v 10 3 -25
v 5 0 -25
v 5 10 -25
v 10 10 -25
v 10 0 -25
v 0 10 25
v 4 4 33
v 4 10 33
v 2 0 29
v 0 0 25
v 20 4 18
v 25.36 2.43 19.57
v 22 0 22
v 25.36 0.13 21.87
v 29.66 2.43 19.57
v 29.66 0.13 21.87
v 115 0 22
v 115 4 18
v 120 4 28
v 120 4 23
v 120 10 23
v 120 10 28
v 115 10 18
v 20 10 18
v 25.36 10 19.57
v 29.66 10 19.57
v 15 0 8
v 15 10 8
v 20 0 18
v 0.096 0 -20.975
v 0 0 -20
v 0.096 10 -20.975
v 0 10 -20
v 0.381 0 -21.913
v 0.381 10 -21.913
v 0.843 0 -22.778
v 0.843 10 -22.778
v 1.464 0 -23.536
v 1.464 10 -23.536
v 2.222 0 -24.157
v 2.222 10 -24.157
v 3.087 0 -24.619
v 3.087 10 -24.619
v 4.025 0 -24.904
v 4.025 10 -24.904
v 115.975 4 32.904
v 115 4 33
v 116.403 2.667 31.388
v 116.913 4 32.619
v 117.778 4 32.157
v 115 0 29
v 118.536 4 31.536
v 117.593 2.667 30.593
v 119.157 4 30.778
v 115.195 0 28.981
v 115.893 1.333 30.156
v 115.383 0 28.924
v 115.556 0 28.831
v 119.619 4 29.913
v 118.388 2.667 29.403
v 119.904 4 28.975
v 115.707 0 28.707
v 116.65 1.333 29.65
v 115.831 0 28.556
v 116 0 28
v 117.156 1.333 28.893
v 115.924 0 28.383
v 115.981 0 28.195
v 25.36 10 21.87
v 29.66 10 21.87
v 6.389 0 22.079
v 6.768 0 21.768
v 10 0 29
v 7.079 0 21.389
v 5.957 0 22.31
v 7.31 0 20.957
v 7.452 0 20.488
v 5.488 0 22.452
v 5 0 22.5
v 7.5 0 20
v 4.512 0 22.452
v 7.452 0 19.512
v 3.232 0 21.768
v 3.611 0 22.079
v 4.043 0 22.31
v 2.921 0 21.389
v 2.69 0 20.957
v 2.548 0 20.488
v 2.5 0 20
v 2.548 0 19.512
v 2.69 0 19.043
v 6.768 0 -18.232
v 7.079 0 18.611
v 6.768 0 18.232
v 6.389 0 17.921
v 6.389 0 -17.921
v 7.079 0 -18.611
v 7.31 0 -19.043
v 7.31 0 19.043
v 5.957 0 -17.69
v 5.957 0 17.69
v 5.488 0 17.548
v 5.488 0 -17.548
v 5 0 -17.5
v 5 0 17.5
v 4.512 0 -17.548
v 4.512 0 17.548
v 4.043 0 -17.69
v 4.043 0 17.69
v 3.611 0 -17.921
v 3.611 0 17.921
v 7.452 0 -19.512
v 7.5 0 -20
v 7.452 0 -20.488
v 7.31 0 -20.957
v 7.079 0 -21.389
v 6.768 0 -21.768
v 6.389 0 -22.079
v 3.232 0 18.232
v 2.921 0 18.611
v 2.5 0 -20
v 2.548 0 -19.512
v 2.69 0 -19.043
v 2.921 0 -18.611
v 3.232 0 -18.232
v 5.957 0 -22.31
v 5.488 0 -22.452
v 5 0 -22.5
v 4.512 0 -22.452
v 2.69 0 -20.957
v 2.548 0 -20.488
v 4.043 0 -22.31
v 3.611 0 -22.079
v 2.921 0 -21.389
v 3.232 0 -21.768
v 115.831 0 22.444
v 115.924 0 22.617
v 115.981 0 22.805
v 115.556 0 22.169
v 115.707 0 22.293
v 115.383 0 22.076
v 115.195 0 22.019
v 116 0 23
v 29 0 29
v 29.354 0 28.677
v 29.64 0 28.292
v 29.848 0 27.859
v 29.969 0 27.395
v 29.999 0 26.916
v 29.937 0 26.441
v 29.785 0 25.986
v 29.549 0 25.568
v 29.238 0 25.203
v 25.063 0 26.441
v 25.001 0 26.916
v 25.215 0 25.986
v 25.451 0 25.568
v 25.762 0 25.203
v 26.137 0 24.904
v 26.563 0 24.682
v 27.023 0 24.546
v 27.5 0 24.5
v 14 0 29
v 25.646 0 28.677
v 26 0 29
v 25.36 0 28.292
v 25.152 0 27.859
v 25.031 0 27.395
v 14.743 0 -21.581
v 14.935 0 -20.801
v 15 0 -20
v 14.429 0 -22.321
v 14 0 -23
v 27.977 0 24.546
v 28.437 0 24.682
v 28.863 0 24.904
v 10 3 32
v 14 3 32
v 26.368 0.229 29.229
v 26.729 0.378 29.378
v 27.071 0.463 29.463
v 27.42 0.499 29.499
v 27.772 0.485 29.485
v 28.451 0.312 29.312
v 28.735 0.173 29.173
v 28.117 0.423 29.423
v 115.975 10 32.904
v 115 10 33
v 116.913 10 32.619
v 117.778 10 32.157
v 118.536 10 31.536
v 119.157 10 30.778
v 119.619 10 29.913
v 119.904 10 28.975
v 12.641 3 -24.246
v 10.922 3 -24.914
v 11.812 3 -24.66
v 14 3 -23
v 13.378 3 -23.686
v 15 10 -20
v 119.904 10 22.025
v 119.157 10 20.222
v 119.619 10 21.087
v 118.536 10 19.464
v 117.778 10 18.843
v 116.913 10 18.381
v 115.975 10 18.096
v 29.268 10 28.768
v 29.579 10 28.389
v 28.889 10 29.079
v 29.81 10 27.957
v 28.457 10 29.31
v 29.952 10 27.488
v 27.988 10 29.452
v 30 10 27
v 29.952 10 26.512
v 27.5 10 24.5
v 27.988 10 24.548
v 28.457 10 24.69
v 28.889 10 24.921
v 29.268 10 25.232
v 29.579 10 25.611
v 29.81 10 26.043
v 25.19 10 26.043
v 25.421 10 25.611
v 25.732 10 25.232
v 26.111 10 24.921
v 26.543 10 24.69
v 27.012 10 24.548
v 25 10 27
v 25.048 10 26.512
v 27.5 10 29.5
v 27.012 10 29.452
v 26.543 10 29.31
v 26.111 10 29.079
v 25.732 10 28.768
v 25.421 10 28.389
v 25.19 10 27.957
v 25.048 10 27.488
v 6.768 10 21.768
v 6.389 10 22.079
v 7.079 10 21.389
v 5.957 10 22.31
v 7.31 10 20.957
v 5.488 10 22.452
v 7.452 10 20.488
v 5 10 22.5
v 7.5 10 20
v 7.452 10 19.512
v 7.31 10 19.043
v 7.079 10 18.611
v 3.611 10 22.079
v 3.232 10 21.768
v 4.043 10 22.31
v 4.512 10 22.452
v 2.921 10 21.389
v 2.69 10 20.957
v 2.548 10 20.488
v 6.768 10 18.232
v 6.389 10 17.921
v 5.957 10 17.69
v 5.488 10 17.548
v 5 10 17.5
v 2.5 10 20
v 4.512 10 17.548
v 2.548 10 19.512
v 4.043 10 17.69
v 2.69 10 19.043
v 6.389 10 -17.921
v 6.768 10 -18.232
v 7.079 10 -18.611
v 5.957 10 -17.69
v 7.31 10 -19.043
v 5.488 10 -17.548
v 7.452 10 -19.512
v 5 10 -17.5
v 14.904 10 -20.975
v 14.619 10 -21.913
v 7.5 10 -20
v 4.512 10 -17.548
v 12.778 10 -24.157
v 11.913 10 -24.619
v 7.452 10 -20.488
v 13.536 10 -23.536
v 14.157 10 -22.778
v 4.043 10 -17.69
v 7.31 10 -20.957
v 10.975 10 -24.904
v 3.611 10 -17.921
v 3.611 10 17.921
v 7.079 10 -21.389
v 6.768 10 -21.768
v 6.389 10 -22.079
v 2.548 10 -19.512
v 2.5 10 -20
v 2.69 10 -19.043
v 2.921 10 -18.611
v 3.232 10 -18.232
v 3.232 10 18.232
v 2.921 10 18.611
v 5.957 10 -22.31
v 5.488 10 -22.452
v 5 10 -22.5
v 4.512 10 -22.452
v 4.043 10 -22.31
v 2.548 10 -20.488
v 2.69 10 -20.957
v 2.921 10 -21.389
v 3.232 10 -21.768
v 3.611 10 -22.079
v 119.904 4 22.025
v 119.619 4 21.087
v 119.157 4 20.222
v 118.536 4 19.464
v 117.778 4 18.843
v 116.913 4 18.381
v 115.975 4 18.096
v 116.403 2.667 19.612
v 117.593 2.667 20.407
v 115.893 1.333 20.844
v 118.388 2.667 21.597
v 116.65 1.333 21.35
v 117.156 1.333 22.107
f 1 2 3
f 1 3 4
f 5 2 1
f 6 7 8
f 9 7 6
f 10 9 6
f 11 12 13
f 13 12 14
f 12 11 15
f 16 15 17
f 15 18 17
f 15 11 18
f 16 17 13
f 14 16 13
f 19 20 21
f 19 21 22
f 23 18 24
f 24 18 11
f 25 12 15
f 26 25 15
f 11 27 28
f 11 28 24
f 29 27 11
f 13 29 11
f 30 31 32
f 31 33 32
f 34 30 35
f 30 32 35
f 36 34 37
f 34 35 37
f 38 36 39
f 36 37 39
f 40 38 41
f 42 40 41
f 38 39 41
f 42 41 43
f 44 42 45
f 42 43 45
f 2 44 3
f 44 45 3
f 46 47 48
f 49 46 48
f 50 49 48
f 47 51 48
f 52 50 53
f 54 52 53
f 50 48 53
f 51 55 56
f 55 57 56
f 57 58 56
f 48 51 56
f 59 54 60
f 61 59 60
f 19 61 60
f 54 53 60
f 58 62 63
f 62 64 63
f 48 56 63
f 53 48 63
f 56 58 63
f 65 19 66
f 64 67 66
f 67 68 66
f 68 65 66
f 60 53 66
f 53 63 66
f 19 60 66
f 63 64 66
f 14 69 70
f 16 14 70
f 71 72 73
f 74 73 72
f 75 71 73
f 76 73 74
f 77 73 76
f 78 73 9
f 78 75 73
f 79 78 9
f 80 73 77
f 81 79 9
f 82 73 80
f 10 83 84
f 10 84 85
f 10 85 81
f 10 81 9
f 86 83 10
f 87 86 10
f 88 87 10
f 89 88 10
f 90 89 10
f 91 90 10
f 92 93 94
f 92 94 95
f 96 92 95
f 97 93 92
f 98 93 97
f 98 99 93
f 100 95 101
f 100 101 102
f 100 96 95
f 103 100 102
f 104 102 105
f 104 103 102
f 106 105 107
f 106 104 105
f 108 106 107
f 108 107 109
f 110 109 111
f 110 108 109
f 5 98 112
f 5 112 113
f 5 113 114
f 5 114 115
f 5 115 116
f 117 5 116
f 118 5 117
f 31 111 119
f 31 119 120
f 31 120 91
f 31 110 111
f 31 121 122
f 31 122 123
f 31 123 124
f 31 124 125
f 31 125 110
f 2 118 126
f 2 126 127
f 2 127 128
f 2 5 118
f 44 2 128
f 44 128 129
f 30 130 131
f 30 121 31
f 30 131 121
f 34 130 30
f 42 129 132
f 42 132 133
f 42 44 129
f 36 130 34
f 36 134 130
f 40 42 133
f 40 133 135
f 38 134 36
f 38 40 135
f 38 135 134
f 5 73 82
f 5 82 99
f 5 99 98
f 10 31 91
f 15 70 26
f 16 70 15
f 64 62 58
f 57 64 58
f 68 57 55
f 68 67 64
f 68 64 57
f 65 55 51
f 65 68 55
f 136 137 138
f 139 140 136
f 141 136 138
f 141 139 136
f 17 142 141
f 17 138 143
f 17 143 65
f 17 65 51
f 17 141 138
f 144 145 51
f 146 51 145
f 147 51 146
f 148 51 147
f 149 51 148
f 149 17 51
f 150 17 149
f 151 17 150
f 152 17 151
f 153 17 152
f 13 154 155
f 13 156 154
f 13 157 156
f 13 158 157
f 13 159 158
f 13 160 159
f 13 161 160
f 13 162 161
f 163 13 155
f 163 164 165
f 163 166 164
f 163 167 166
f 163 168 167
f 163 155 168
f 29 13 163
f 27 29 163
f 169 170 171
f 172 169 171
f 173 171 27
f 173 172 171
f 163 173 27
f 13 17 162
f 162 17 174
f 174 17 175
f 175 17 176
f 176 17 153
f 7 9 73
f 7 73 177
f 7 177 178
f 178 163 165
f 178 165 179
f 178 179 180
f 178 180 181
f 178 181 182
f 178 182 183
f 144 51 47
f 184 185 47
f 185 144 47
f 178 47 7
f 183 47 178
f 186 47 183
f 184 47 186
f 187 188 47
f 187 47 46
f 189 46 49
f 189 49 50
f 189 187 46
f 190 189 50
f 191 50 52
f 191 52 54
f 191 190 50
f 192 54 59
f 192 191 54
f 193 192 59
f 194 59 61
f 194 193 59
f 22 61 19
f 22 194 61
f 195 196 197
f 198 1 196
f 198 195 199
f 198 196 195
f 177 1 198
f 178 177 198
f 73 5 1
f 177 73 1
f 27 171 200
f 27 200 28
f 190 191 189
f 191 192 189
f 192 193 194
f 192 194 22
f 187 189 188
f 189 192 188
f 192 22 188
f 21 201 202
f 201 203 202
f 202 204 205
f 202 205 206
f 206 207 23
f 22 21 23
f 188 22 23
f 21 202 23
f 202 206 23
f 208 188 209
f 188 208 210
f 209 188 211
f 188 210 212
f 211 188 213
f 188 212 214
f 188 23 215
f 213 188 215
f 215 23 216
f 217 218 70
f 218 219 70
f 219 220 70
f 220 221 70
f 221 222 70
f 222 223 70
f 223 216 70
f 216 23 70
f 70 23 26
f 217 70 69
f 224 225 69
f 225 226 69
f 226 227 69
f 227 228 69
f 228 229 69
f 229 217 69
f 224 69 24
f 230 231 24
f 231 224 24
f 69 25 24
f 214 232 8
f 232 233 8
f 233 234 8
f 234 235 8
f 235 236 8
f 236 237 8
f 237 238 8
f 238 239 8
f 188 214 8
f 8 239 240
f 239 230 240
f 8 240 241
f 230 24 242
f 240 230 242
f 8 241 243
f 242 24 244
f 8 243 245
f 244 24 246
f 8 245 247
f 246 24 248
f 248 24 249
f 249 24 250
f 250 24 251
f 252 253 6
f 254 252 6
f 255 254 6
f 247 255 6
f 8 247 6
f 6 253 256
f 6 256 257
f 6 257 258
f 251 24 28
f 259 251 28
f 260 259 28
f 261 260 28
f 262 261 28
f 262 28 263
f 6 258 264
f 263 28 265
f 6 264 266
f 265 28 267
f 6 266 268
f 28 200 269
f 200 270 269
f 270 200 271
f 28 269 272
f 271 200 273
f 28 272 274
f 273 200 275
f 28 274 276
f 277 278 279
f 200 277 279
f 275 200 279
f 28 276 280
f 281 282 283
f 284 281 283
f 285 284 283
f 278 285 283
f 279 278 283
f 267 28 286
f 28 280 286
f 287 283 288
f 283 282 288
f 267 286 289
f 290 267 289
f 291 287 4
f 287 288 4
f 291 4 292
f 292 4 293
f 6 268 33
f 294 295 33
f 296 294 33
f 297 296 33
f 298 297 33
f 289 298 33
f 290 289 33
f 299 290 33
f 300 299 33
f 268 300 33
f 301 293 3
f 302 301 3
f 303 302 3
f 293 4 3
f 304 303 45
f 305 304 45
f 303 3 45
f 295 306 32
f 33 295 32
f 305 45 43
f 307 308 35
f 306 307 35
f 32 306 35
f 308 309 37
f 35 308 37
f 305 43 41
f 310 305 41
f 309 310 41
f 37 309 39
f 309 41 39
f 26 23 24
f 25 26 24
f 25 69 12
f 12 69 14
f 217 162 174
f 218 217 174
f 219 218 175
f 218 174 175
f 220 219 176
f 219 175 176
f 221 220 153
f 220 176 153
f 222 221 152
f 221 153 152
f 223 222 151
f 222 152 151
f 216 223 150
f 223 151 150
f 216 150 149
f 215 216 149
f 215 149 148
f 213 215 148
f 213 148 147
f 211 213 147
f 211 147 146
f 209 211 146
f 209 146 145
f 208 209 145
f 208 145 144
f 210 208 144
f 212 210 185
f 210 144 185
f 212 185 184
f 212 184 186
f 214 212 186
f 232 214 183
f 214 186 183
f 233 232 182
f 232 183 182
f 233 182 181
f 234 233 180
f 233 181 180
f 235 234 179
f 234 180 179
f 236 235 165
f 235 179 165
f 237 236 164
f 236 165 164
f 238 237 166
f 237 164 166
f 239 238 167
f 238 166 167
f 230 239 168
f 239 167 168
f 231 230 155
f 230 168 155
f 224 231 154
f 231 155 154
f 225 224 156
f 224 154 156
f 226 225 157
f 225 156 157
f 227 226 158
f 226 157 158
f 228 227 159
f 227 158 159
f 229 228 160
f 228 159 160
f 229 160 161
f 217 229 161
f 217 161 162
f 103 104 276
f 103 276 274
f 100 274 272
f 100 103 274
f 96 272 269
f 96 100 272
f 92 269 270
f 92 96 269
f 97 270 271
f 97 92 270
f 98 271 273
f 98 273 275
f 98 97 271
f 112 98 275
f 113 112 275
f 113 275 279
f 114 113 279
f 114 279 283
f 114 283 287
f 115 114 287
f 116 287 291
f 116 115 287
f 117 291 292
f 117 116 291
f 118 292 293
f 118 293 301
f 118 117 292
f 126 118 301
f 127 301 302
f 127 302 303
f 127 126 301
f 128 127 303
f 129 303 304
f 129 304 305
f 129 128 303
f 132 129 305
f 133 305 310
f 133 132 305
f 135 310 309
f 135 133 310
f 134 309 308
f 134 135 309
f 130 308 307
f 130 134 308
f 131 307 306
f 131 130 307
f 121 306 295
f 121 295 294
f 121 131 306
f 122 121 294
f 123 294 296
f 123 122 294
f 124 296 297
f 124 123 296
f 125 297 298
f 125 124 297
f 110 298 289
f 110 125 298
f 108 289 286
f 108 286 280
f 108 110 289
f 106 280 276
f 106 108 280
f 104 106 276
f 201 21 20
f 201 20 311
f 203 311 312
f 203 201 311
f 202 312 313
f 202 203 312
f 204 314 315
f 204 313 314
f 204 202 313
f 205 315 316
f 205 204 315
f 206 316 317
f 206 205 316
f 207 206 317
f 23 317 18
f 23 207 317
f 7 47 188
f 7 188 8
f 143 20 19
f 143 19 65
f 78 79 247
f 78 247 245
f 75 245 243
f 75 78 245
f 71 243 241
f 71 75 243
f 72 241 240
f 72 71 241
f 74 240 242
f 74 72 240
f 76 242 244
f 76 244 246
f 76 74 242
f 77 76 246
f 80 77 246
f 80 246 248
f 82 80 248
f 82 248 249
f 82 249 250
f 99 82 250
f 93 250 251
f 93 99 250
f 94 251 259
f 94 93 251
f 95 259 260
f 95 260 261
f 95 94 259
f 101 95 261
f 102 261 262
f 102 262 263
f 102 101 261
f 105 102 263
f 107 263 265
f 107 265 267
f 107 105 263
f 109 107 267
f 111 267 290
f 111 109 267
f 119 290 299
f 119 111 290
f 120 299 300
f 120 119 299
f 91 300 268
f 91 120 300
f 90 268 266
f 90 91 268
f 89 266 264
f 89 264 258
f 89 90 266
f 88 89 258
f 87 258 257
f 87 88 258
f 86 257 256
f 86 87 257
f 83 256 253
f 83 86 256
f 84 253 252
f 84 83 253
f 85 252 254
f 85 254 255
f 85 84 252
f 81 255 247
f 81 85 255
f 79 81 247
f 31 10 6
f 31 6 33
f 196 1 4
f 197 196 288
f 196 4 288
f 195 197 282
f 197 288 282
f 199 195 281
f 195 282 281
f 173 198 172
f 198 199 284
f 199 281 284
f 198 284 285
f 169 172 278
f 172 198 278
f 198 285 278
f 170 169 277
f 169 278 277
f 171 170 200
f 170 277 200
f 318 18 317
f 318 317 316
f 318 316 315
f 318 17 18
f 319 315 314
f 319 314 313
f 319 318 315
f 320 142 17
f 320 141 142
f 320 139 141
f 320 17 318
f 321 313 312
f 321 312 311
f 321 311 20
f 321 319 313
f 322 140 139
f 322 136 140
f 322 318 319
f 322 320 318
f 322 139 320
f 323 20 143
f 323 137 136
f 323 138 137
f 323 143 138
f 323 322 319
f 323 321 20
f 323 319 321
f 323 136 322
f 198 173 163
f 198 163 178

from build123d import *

# Parameters (mm, degrees)
SKETCH1_R           = 2.5
SKETCH1_W           = 4.3
SKETCH1_H           = 2.3
BOSS_EXTRUDE1_DEPTH = 10
SKETCH2_W           = 4
SKETCH2_H           = 59.39567842
CUT_EXTRUDE1_DEPTH  = 3
FILLET3_R           = 5
CHAMFER2_SIZE       = 4
SKETCH3_R           = 2.5
CUT_EXTRUDE2_DEPTH  = 10


with BuildPart() as part:
    # Sketch1 → Boss-Extrude1 (new body)
    with BuildSketch(Plane(origin=(0, 0, 0), x_dir=(1, 0, 0), z_dir=(0, 1, 0))):
        Polygon((0, -25), (0, 25), (15, 25), (15, -8), (20, -18), (32, -18), (35, -18), (120, -18), (120, -33), (4, -33), align=None)
        with Locations(Location((5, 20, 0), (0, 0, 270))):
            Circle(SKETCH1_R, mode=Mode.SUBTRACT)
        with Locations(Location((5, -20, 0), (0, 0, 270))):
            Circle(SKETCH1_R, mode=Mode.SUBTRACT)
        with Locations((27.51, -20.72)):
            Rectangle(SKETCH1_W, SKETCH1_H, mode=Mode.SUBTRACT)
    extrude(amount=BOSS_EXTRUDE1_DEPTH)

    # Sketch2 → Cut-Extrude1 (cut)
    with BuildSketch(Plane.XZ):
        with Locations((12, 4.69783921)):
            Rectangle(SKETCH2_W, SKETCH2_H)
    extrude(amount=-CUT_EXTRUDE1_DEPTH, mode=Mode.SUBTRACT)

    # Fillet3
    fillet3_edges = [part.edges().sort_by_distance(p)[0] for p in [
        (120, 5, 33),
        (120, 5, 18),
        (0, 5, -25),
        (15, 5, -25),
    ]]
    fillet(fillet3_edges, radius=FILLET3_R)

    # Chamfer2
    # the kernel refuses this chamfer: 4 mm, written as the material it takes off along each edge
    with BuildSketch(Plane(origin=(20.286731952, 0, 33), x_dir=(0, -0.027495876610586365, -0.9996219169112968), z_dir=(-1, 0, 0))) as chamfer2_piece_1:
        Polygon((CHAMFER2_SIZE * 0.999621916911, -CHAMFER2_SIZE * 0.0274958766106), (-CHAMFER2_SIZE * 0.0274958766106, -CHAMFER2_SIZE * 0.999621916911), (0, 0), align=None)
    extrude(amount=26.573463904, mode=Mode.SUBTRACT)
    with BuildSketch(Plane(origin=(115, 0, 33), x_dir=(0, 0.9996219169112968, 0.02749587661058563), z_dir=(-1, 0, 0))) as chamfer2_piece_2:
        Polygon((CHAMFER2_SIZE * 0.999621916911, CHAMFER2_SIZE * 0.0274958766106), (-CHAMFER2_SIZE * 0.0274958766106, CHAMFER2_SIZE * 0.999621916911), (0, 0), align=None)
    extrude(amount=111.286731952, mode=Mode.SUBTRACT)
    with BuildSketch(Plane(origin=(120, 0, 23), x_dir=(0.02749587661058563, 0.9996219169112968, 0), z_dir=(0, 0, 1))) as chamfer2_piece_3:
        Polygon((CHAMFER2_SIZE * 0.999621916911, CHAMFER2_SIZE * 0.0274958766106), (-CHAMFER2_SIZE * 0.0274958766106, CHAMFER2_SIZE * 0.999621916911), (0, 0), align=None)
    extrude(amount=5, mode=Mode.SUBTRACT)
    with BuildSketch(Plane(origin=(115, 0, 18), x_dir=(0, 0.999621916911297, -0.02749587661058045), z_dir=(-1, 0, 0))) as chamfer2_piece_4_section:
        Polygon((CHAMFER2_SIZE * 0.999621916911, -CHAMFER2_SIZE * 0.0274958766106), (-CHAMFER2_SIZE * 0.0274958766106, -CHAMFER2_SIZE * 0.999621916911), (0, 0), align=None)
    chamfer2_piece_4 = extrude(amount=105.286731952, mode=Mode.PRIVATE)
    chamfer2_piece_4 = split(chamfer2_piece_4, bisect_by=Plane(origin=(30.091205291, 1.322053336, 38.182410583), z_dir=(0.8944271909999159, 0, -0.4472135954999581)), keep=Keep.TOP, mode=Mode.PRIVATE)
    add(chamfer2_piece_4, mode=Mode.SUBTRACT)
    with BuildSketch(Plane(origin=(115, 0, 23), x_dir=(0, 0, -1), z_dir=(-1, 0, 0))) as chamfer2_piece_5:
        Polygon((5, -CHAMFER2_SIZE), (5 - CHAMFER2_SIZE, 0), (5, 0), align=None)
    revolve(axis=Axis((115, 0, 23), (0, -1, 0)), revolution_arc=90, mode=Mode.SUBTRACT)
    with BuildSketch(Plane(origin=(115, 0, 28), x_dir=(0, 0, 1), z_dir=(-1, 0, 0))) as chamfer2_piece_6:
        Polygon((5, CHAMFER2_SIZE), (5 - CHAMFER2_SIZE, 0), (5, 0), align=None)
    revolve(axis=Axis((115, 0, 28), (0, 1, 0)), revolution_arc=90, mode=Mode.SUBTRACT)

    # Sketch3 → Cut-Extrude2 (cut)
    with BuildSketch(Plane.XZ):
        with Locations(Location((27.5, 27, 0), (0, 0, 270))):
            Circle(SKETCH3_R)
    extrude(amount=-CUT_EXTRUDE2_DEPTH, mode=Mode.SUBTRACT)


solid = part.part
